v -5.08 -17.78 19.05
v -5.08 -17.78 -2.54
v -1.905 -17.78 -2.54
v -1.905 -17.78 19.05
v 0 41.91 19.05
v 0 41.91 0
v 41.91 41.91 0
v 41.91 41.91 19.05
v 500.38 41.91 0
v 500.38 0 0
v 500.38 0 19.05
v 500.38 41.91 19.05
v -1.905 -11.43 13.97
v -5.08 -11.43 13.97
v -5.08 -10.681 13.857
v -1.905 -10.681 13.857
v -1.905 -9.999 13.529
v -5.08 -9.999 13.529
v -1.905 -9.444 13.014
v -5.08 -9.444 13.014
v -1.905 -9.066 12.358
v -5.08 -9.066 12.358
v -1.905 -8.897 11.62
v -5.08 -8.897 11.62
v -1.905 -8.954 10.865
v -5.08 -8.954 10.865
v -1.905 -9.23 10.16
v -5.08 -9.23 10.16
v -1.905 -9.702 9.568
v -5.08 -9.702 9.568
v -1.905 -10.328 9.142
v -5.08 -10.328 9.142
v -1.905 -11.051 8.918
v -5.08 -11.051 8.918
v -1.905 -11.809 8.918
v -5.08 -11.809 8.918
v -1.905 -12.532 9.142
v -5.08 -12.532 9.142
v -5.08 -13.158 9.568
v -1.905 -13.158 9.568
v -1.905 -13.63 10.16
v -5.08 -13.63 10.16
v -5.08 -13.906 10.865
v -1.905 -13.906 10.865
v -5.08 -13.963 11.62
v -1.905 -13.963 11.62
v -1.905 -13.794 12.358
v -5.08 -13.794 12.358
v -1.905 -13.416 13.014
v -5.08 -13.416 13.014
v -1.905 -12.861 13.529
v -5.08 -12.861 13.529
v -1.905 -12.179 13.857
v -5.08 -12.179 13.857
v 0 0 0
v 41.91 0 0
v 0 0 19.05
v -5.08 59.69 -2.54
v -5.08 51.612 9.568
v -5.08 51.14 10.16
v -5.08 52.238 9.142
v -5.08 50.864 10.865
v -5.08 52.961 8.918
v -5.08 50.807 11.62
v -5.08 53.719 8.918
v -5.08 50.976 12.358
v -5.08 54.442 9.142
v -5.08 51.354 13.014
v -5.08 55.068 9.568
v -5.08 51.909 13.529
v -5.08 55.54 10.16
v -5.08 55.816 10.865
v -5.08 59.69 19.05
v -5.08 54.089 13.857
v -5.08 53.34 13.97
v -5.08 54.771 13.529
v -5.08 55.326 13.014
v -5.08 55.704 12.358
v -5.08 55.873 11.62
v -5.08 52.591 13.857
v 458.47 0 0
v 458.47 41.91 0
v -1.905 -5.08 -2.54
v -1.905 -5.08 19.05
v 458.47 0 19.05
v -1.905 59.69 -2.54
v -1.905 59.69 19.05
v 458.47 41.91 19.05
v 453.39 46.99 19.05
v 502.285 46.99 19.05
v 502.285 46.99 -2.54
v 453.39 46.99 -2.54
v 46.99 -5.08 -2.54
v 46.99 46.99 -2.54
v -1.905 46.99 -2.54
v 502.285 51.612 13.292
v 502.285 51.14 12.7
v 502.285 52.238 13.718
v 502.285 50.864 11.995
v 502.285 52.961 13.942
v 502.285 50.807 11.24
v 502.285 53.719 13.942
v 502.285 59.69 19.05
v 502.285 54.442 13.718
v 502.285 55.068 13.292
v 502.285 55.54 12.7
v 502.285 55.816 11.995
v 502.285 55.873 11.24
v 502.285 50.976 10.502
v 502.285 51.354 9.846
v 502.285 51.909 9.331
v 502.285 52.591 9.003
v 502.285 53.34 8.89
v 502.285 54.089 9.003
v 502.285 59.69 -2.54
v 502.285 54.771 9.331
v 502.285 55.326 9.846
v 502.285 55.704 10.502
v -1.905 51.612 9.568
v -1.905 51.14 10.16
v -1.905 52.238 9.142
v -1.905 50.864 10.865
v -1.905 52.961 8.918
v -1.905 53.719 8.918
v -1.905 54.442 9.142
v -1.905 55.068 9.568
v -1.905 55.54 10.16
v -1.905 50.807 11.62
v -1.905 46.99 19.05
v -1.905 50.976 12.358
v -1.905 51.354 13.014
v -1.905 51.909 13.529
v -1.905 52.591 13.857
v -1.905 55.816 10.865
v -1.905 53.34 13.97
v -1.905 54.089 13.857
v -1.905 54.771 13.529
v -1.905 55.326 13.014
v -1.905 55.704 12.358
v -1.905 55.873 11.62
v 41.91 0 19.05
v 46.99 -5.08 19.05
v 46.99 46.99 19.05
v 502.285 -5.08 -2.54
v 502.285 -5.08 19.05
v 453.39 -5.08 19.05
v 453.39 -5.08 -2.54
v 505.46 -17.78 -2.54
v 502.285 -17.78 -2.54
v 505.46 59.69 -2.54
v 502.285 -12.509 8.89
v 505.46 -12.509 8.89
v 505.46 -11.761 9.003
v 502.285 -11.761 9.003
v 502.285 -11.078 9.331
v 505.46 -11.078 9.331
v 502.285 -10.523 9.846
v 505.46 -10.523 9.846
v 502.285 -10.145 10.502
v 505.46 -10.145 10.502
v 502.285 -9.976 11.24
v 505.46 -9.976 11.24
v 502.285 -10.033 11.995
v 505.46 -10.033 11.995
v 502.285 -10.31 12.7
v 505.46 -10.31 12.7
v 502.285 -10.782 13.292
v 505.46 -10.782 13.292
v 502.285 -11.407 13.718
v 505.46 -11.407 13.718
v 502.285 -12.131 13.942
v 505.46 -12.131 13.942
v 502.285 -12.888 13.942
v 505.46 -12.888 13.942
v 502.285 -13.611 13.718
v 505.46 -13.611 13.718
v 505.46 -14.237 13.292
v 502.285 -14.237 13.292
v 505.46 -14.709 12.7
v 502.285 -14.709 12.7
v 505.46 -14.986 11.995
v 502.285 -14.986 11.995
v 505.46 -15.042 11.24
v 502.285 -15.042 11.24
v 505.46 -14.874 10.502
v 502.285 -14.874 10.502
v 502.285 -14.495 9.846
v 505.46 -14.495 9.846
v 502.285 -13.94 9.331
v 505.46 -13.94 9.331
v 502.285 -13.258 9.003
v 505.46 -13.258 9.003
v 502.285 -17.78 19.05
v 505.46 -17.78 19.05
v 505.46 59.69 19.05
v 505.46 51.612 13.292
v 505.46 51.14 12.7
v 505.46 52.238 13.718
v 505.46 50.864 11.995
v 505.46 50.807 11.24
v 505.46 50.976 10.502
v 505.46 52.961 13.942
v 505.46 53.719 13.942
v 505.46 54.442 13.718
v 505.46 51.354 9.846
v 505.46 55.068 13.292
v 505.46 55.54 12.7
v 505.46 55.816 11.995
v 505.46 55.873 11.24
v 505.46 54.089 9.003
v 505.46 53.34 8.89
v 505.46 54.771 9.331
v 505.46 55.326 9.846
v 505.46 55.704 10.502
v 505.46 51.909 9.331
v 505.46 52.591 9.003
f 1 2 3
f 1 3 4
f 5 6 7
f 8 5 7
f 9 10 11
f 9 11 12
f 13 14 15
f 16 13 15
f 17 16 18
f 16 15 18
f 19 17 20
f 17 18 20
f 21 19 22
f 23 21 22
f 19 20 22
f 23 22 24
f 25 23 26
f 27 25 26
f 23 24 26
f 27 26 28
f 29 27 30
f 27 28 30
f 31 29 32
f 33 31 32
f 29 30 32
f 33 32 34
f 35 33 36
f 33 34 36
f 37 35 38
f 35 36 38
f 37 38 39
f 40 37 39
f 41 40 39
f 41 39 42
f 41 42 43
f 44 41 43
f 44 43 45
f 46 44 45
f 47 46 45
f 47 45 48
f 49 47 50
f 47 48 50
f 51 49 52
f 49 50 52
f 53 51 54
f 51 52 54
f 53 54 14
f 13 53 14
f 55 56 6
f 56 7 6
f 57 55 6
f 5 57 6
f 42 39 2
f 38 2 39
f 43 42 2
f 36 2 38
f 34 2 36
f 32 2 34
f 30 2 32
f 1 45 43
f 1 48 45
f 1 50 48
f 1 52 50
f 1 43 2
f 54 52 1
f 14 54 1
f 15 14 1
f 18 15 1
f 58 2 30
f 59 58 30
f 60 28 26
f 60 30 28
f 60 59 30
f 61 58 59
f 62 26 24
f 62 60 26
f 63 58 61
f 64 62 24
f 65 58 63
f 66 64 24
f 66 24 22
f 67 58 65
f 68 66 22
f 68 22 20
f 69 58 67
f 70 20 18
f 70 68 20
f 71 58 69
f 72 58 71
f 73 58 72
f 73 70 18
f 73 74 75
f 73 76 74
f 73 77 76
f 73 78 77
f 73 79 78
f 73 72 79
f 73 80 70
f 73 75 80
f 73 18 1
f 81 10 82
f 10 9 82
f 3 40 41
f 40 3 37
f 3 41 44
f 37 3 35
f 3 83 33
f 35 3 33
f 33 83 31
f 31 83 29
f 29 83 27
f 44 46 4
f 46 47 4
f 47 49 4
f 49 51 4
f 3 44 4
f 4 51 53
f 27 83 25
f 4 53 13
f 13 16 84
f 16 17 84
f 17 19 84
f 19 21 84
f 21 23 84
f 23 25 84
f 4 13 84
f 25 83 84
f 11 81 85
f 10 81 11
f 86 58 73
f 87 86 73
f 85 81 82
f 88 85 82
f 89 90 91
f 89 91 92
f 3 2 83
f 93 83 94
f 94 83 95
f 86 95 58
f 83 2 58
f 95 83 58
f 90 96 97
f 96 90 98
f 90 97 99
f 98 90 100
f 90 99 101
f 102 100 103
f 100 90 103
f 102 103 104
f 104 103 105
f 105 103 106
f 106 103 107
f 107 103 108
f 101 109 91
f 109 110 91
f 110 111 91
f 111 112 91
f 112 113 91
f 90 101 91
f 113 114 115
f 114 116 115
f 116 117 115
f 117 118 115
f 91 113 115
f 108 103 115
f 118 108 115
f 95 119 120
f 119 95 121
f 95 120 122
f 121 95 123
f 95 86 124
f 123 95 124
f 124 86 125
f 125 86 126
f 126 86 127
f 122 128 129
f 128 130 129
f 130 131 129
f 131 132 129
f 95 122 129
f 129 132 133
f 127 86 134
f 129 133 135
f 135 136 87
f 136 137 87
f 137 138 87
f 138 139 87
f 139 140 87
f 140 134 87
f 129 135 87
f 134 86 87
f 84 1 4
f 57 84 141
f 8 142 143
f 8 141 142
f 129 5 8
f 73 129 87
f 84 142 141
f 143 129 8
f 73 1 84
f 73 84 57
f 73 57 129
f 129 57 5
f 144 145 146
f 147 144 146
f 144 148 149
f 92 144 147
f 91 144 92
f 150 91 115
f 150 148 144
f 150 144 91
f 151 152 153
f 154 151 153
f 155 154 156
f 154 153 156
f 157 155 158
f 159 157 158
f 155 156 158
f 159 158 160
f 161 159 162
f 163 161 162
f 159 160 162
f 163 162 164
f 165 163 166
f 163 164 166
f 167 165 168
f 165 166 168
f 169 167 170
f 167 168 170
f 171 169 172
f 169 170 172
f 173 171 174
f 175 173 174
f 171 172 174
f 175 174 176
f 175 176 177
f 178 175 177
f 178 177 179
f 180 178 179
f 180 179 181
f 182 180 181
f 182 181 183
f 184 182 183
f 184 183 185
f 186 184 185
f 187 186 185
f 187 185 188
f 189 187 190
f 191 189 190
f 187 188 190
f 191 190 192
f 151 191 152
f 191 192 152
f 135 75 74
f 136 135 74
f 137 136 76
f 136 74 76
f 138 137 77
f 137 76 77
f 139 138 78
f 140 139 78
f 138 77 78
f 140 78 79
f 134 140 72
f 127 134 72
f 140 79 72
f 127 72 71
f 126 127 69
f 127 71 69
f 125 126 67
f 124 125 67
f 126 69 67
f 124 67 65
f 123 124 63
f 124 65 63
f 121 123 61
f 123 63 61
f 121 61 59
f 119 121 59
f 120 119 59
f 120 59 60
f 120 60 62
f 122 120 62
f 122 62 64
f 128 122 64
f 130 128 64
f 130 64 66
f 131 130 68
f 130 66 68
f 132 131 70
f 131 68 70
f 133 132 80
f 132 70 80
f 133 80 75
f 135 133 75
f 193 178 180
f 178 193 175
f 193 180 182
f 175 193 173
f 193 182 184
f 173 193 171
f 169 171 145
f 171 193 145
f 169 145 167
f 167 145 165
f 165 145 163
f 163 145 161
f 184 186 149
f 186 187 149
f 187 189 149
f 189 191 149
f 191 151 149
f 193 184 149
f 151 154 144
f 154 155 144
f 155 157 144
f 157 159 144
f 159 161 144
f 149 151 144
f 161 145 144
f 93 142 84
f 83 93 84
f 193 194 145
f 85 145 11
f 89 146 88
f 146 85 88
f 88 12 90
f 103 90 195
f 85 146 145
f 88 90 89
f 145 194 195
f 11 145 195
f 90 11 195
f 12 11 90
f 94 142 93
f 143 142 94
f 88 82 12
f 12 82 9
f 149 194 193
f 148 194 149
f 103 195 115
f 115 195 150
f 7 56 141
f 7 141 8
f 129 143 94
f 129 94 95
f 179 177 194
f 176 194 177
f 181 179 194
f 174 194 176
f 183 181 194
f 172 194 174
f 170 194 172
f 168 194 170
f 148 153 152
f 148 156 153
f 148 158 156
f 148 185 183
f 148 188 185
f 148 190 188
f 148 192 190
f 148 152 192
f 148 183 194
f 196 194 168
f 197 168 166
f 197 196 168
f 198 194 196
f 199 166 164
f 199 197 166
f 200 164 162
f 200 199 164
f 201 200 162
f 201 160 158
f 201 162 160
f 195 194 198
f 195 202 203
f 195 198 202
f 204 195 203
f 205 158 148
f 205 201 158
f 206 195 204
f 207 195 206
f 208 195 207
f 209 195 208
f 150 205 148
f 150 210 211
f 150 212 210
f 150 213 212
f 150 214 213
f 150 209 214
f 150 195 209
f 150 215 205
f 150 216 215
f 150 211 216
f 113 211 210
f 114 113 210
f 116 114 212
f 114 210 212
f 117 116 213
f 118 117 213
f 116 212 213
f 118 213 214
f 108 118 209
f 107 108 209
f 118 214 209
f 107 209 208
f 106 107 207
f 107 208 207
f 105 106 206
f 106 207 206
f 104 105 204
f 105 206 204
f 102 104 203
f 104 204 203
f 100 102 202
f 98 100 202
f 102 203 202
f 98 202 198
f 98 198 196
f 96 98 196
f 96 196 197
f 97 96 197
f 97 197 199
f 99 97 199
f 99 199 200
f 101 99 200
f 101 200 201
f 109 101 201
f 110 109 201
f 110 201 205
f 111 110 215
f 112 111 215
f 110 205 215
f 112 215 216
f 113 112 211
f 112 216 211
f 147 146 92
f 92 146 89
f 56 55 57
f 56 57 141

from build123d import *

# Parameters (mm, degrees)
SKETCH1_W             = 52.07
SKETCH1_H             = 52.07
SKETCH1_W_2           = 41.91
SKETCH1_H_2           = 41.91
BOSS_EXTRUDE1_DEPTH   = 19.05
BOSS_EXTRUDE1_2_DEPTH = 19.05
SKETCH3_W             = 52.07
SKETCH3_H             = 52.07
BOSS_EXTRUDE6_DEPTH   = 2.54
SKETCH4_W             = 21.59
SKETCH4_H             = 12.7
SKETCH4_R             = 2.54
BOSS_EXTRUDE7_DEPTH   = 3.175
SKETCH5_W             = 21.59
SKETCH5_H             = 12.7
SKETCH5_R             = 2.54
BOSS_EXTRUDE8_DEPTH   = 3.175


with BuildPart() as part:
    # Sketch1 → Boss-Extrude1 (new body)
    with BuildSketch(Plane.XY):
        with Locations((20.955, 20.955)):
            Rectangle(SKETCH1_W, SKETCH1_H)
        with Locations((20.955, 20.955)):
            Rectangle(SKETCH1_W_2, SKETCH1_H_2, mode=Mode.SUBTRACT)
    extrude(amount=BOSS_EXTRUDE1_DEPTH)



with BuildPart() as body_2:
    # Sketch1 → Boss-Extrude1 2 (new body)
    with BuildSketch(Plane.XY):
        with Locations((479.425, 20.955)):
            Rectangle(SKETCH1_W, SKETCH1_H)
        with Locations((479.425, 20.955)):
            Rectangle(SKETCH1_W_2, SKETCH1_H_2, mode=Mode.SUBTRACT)
    extrude(amount=BOSS_EXTRUDE1_2_DEPTH)


with BuildPart() as part_1:
    add(part.part)

    add(body_2.part)  # Boss-Extrude6 merges body 2
    # Sketch3 → Boss-Extrude6 (add)
    with BuildSketch(Plane(origin=(0, 0, 0), x_dir=(-1, 0, 0), z_dir=(0, 0, -1))):
        with Locations((-20.955, 20.955)):
            Rectangle(SKETCH3_W, SKETCH3_H)
        with Locations((-479.425, 20.955)):
            Rectangle(SKETCH3_W, SKETCH3_H)
    extrude(amount=BOSS_EXTRUDE6_DEPTH)

    # Sketch4 → Boss-Extrude7 (add)
    with BuildSketch(Plane.ZY.offset(5.08)):
        with Locations((8.255, -11.43)):
            Rectangle(SKETCH4_W, SKETCH4_H)
        with Locations((11.43, -11.43)):
            Circle(SKETCH4_R, mode=Mode.SUBTRACT)
        with Locations((8.255, 53.34)):
            Rectangle(SKETCH4_W, SKETCH4_H)
        with Locations((11.43, 53.34)):
            Circle(SKETCH4_R, mode=Mode.SUBTRACT)
    extrude(amount=-BOSS_EXTRUDE7_DEPTH)

    # Sketch5 → Boss-Extrude8 (add)
    with BuildSketch(Plane(origin=(505.46, 0, 0), x_dir=(0, 0, -1), z_dir=(1, 0, 0))):
        with Locations((-8.255, -11.43)):
            Rectangle(SKETCH5_W, SKETCH5_H)
        with Locations((-11.43, -12.509213566)):
            Circle(SKETCH5_R, mode=Mode.SUBTRACT)
        with Locations((-8.255, 53.34)):
            Rectangle(SKETCH5_W, SKETCH5_H)
        with Locations((-11.43, 53.34)):
            Circle(SKETCH5_R, mode=Mode.SUBTRACT)
    extrude(amount=-BOSS_EXTRUDE8_DEPTH)


solid = part_1.part
